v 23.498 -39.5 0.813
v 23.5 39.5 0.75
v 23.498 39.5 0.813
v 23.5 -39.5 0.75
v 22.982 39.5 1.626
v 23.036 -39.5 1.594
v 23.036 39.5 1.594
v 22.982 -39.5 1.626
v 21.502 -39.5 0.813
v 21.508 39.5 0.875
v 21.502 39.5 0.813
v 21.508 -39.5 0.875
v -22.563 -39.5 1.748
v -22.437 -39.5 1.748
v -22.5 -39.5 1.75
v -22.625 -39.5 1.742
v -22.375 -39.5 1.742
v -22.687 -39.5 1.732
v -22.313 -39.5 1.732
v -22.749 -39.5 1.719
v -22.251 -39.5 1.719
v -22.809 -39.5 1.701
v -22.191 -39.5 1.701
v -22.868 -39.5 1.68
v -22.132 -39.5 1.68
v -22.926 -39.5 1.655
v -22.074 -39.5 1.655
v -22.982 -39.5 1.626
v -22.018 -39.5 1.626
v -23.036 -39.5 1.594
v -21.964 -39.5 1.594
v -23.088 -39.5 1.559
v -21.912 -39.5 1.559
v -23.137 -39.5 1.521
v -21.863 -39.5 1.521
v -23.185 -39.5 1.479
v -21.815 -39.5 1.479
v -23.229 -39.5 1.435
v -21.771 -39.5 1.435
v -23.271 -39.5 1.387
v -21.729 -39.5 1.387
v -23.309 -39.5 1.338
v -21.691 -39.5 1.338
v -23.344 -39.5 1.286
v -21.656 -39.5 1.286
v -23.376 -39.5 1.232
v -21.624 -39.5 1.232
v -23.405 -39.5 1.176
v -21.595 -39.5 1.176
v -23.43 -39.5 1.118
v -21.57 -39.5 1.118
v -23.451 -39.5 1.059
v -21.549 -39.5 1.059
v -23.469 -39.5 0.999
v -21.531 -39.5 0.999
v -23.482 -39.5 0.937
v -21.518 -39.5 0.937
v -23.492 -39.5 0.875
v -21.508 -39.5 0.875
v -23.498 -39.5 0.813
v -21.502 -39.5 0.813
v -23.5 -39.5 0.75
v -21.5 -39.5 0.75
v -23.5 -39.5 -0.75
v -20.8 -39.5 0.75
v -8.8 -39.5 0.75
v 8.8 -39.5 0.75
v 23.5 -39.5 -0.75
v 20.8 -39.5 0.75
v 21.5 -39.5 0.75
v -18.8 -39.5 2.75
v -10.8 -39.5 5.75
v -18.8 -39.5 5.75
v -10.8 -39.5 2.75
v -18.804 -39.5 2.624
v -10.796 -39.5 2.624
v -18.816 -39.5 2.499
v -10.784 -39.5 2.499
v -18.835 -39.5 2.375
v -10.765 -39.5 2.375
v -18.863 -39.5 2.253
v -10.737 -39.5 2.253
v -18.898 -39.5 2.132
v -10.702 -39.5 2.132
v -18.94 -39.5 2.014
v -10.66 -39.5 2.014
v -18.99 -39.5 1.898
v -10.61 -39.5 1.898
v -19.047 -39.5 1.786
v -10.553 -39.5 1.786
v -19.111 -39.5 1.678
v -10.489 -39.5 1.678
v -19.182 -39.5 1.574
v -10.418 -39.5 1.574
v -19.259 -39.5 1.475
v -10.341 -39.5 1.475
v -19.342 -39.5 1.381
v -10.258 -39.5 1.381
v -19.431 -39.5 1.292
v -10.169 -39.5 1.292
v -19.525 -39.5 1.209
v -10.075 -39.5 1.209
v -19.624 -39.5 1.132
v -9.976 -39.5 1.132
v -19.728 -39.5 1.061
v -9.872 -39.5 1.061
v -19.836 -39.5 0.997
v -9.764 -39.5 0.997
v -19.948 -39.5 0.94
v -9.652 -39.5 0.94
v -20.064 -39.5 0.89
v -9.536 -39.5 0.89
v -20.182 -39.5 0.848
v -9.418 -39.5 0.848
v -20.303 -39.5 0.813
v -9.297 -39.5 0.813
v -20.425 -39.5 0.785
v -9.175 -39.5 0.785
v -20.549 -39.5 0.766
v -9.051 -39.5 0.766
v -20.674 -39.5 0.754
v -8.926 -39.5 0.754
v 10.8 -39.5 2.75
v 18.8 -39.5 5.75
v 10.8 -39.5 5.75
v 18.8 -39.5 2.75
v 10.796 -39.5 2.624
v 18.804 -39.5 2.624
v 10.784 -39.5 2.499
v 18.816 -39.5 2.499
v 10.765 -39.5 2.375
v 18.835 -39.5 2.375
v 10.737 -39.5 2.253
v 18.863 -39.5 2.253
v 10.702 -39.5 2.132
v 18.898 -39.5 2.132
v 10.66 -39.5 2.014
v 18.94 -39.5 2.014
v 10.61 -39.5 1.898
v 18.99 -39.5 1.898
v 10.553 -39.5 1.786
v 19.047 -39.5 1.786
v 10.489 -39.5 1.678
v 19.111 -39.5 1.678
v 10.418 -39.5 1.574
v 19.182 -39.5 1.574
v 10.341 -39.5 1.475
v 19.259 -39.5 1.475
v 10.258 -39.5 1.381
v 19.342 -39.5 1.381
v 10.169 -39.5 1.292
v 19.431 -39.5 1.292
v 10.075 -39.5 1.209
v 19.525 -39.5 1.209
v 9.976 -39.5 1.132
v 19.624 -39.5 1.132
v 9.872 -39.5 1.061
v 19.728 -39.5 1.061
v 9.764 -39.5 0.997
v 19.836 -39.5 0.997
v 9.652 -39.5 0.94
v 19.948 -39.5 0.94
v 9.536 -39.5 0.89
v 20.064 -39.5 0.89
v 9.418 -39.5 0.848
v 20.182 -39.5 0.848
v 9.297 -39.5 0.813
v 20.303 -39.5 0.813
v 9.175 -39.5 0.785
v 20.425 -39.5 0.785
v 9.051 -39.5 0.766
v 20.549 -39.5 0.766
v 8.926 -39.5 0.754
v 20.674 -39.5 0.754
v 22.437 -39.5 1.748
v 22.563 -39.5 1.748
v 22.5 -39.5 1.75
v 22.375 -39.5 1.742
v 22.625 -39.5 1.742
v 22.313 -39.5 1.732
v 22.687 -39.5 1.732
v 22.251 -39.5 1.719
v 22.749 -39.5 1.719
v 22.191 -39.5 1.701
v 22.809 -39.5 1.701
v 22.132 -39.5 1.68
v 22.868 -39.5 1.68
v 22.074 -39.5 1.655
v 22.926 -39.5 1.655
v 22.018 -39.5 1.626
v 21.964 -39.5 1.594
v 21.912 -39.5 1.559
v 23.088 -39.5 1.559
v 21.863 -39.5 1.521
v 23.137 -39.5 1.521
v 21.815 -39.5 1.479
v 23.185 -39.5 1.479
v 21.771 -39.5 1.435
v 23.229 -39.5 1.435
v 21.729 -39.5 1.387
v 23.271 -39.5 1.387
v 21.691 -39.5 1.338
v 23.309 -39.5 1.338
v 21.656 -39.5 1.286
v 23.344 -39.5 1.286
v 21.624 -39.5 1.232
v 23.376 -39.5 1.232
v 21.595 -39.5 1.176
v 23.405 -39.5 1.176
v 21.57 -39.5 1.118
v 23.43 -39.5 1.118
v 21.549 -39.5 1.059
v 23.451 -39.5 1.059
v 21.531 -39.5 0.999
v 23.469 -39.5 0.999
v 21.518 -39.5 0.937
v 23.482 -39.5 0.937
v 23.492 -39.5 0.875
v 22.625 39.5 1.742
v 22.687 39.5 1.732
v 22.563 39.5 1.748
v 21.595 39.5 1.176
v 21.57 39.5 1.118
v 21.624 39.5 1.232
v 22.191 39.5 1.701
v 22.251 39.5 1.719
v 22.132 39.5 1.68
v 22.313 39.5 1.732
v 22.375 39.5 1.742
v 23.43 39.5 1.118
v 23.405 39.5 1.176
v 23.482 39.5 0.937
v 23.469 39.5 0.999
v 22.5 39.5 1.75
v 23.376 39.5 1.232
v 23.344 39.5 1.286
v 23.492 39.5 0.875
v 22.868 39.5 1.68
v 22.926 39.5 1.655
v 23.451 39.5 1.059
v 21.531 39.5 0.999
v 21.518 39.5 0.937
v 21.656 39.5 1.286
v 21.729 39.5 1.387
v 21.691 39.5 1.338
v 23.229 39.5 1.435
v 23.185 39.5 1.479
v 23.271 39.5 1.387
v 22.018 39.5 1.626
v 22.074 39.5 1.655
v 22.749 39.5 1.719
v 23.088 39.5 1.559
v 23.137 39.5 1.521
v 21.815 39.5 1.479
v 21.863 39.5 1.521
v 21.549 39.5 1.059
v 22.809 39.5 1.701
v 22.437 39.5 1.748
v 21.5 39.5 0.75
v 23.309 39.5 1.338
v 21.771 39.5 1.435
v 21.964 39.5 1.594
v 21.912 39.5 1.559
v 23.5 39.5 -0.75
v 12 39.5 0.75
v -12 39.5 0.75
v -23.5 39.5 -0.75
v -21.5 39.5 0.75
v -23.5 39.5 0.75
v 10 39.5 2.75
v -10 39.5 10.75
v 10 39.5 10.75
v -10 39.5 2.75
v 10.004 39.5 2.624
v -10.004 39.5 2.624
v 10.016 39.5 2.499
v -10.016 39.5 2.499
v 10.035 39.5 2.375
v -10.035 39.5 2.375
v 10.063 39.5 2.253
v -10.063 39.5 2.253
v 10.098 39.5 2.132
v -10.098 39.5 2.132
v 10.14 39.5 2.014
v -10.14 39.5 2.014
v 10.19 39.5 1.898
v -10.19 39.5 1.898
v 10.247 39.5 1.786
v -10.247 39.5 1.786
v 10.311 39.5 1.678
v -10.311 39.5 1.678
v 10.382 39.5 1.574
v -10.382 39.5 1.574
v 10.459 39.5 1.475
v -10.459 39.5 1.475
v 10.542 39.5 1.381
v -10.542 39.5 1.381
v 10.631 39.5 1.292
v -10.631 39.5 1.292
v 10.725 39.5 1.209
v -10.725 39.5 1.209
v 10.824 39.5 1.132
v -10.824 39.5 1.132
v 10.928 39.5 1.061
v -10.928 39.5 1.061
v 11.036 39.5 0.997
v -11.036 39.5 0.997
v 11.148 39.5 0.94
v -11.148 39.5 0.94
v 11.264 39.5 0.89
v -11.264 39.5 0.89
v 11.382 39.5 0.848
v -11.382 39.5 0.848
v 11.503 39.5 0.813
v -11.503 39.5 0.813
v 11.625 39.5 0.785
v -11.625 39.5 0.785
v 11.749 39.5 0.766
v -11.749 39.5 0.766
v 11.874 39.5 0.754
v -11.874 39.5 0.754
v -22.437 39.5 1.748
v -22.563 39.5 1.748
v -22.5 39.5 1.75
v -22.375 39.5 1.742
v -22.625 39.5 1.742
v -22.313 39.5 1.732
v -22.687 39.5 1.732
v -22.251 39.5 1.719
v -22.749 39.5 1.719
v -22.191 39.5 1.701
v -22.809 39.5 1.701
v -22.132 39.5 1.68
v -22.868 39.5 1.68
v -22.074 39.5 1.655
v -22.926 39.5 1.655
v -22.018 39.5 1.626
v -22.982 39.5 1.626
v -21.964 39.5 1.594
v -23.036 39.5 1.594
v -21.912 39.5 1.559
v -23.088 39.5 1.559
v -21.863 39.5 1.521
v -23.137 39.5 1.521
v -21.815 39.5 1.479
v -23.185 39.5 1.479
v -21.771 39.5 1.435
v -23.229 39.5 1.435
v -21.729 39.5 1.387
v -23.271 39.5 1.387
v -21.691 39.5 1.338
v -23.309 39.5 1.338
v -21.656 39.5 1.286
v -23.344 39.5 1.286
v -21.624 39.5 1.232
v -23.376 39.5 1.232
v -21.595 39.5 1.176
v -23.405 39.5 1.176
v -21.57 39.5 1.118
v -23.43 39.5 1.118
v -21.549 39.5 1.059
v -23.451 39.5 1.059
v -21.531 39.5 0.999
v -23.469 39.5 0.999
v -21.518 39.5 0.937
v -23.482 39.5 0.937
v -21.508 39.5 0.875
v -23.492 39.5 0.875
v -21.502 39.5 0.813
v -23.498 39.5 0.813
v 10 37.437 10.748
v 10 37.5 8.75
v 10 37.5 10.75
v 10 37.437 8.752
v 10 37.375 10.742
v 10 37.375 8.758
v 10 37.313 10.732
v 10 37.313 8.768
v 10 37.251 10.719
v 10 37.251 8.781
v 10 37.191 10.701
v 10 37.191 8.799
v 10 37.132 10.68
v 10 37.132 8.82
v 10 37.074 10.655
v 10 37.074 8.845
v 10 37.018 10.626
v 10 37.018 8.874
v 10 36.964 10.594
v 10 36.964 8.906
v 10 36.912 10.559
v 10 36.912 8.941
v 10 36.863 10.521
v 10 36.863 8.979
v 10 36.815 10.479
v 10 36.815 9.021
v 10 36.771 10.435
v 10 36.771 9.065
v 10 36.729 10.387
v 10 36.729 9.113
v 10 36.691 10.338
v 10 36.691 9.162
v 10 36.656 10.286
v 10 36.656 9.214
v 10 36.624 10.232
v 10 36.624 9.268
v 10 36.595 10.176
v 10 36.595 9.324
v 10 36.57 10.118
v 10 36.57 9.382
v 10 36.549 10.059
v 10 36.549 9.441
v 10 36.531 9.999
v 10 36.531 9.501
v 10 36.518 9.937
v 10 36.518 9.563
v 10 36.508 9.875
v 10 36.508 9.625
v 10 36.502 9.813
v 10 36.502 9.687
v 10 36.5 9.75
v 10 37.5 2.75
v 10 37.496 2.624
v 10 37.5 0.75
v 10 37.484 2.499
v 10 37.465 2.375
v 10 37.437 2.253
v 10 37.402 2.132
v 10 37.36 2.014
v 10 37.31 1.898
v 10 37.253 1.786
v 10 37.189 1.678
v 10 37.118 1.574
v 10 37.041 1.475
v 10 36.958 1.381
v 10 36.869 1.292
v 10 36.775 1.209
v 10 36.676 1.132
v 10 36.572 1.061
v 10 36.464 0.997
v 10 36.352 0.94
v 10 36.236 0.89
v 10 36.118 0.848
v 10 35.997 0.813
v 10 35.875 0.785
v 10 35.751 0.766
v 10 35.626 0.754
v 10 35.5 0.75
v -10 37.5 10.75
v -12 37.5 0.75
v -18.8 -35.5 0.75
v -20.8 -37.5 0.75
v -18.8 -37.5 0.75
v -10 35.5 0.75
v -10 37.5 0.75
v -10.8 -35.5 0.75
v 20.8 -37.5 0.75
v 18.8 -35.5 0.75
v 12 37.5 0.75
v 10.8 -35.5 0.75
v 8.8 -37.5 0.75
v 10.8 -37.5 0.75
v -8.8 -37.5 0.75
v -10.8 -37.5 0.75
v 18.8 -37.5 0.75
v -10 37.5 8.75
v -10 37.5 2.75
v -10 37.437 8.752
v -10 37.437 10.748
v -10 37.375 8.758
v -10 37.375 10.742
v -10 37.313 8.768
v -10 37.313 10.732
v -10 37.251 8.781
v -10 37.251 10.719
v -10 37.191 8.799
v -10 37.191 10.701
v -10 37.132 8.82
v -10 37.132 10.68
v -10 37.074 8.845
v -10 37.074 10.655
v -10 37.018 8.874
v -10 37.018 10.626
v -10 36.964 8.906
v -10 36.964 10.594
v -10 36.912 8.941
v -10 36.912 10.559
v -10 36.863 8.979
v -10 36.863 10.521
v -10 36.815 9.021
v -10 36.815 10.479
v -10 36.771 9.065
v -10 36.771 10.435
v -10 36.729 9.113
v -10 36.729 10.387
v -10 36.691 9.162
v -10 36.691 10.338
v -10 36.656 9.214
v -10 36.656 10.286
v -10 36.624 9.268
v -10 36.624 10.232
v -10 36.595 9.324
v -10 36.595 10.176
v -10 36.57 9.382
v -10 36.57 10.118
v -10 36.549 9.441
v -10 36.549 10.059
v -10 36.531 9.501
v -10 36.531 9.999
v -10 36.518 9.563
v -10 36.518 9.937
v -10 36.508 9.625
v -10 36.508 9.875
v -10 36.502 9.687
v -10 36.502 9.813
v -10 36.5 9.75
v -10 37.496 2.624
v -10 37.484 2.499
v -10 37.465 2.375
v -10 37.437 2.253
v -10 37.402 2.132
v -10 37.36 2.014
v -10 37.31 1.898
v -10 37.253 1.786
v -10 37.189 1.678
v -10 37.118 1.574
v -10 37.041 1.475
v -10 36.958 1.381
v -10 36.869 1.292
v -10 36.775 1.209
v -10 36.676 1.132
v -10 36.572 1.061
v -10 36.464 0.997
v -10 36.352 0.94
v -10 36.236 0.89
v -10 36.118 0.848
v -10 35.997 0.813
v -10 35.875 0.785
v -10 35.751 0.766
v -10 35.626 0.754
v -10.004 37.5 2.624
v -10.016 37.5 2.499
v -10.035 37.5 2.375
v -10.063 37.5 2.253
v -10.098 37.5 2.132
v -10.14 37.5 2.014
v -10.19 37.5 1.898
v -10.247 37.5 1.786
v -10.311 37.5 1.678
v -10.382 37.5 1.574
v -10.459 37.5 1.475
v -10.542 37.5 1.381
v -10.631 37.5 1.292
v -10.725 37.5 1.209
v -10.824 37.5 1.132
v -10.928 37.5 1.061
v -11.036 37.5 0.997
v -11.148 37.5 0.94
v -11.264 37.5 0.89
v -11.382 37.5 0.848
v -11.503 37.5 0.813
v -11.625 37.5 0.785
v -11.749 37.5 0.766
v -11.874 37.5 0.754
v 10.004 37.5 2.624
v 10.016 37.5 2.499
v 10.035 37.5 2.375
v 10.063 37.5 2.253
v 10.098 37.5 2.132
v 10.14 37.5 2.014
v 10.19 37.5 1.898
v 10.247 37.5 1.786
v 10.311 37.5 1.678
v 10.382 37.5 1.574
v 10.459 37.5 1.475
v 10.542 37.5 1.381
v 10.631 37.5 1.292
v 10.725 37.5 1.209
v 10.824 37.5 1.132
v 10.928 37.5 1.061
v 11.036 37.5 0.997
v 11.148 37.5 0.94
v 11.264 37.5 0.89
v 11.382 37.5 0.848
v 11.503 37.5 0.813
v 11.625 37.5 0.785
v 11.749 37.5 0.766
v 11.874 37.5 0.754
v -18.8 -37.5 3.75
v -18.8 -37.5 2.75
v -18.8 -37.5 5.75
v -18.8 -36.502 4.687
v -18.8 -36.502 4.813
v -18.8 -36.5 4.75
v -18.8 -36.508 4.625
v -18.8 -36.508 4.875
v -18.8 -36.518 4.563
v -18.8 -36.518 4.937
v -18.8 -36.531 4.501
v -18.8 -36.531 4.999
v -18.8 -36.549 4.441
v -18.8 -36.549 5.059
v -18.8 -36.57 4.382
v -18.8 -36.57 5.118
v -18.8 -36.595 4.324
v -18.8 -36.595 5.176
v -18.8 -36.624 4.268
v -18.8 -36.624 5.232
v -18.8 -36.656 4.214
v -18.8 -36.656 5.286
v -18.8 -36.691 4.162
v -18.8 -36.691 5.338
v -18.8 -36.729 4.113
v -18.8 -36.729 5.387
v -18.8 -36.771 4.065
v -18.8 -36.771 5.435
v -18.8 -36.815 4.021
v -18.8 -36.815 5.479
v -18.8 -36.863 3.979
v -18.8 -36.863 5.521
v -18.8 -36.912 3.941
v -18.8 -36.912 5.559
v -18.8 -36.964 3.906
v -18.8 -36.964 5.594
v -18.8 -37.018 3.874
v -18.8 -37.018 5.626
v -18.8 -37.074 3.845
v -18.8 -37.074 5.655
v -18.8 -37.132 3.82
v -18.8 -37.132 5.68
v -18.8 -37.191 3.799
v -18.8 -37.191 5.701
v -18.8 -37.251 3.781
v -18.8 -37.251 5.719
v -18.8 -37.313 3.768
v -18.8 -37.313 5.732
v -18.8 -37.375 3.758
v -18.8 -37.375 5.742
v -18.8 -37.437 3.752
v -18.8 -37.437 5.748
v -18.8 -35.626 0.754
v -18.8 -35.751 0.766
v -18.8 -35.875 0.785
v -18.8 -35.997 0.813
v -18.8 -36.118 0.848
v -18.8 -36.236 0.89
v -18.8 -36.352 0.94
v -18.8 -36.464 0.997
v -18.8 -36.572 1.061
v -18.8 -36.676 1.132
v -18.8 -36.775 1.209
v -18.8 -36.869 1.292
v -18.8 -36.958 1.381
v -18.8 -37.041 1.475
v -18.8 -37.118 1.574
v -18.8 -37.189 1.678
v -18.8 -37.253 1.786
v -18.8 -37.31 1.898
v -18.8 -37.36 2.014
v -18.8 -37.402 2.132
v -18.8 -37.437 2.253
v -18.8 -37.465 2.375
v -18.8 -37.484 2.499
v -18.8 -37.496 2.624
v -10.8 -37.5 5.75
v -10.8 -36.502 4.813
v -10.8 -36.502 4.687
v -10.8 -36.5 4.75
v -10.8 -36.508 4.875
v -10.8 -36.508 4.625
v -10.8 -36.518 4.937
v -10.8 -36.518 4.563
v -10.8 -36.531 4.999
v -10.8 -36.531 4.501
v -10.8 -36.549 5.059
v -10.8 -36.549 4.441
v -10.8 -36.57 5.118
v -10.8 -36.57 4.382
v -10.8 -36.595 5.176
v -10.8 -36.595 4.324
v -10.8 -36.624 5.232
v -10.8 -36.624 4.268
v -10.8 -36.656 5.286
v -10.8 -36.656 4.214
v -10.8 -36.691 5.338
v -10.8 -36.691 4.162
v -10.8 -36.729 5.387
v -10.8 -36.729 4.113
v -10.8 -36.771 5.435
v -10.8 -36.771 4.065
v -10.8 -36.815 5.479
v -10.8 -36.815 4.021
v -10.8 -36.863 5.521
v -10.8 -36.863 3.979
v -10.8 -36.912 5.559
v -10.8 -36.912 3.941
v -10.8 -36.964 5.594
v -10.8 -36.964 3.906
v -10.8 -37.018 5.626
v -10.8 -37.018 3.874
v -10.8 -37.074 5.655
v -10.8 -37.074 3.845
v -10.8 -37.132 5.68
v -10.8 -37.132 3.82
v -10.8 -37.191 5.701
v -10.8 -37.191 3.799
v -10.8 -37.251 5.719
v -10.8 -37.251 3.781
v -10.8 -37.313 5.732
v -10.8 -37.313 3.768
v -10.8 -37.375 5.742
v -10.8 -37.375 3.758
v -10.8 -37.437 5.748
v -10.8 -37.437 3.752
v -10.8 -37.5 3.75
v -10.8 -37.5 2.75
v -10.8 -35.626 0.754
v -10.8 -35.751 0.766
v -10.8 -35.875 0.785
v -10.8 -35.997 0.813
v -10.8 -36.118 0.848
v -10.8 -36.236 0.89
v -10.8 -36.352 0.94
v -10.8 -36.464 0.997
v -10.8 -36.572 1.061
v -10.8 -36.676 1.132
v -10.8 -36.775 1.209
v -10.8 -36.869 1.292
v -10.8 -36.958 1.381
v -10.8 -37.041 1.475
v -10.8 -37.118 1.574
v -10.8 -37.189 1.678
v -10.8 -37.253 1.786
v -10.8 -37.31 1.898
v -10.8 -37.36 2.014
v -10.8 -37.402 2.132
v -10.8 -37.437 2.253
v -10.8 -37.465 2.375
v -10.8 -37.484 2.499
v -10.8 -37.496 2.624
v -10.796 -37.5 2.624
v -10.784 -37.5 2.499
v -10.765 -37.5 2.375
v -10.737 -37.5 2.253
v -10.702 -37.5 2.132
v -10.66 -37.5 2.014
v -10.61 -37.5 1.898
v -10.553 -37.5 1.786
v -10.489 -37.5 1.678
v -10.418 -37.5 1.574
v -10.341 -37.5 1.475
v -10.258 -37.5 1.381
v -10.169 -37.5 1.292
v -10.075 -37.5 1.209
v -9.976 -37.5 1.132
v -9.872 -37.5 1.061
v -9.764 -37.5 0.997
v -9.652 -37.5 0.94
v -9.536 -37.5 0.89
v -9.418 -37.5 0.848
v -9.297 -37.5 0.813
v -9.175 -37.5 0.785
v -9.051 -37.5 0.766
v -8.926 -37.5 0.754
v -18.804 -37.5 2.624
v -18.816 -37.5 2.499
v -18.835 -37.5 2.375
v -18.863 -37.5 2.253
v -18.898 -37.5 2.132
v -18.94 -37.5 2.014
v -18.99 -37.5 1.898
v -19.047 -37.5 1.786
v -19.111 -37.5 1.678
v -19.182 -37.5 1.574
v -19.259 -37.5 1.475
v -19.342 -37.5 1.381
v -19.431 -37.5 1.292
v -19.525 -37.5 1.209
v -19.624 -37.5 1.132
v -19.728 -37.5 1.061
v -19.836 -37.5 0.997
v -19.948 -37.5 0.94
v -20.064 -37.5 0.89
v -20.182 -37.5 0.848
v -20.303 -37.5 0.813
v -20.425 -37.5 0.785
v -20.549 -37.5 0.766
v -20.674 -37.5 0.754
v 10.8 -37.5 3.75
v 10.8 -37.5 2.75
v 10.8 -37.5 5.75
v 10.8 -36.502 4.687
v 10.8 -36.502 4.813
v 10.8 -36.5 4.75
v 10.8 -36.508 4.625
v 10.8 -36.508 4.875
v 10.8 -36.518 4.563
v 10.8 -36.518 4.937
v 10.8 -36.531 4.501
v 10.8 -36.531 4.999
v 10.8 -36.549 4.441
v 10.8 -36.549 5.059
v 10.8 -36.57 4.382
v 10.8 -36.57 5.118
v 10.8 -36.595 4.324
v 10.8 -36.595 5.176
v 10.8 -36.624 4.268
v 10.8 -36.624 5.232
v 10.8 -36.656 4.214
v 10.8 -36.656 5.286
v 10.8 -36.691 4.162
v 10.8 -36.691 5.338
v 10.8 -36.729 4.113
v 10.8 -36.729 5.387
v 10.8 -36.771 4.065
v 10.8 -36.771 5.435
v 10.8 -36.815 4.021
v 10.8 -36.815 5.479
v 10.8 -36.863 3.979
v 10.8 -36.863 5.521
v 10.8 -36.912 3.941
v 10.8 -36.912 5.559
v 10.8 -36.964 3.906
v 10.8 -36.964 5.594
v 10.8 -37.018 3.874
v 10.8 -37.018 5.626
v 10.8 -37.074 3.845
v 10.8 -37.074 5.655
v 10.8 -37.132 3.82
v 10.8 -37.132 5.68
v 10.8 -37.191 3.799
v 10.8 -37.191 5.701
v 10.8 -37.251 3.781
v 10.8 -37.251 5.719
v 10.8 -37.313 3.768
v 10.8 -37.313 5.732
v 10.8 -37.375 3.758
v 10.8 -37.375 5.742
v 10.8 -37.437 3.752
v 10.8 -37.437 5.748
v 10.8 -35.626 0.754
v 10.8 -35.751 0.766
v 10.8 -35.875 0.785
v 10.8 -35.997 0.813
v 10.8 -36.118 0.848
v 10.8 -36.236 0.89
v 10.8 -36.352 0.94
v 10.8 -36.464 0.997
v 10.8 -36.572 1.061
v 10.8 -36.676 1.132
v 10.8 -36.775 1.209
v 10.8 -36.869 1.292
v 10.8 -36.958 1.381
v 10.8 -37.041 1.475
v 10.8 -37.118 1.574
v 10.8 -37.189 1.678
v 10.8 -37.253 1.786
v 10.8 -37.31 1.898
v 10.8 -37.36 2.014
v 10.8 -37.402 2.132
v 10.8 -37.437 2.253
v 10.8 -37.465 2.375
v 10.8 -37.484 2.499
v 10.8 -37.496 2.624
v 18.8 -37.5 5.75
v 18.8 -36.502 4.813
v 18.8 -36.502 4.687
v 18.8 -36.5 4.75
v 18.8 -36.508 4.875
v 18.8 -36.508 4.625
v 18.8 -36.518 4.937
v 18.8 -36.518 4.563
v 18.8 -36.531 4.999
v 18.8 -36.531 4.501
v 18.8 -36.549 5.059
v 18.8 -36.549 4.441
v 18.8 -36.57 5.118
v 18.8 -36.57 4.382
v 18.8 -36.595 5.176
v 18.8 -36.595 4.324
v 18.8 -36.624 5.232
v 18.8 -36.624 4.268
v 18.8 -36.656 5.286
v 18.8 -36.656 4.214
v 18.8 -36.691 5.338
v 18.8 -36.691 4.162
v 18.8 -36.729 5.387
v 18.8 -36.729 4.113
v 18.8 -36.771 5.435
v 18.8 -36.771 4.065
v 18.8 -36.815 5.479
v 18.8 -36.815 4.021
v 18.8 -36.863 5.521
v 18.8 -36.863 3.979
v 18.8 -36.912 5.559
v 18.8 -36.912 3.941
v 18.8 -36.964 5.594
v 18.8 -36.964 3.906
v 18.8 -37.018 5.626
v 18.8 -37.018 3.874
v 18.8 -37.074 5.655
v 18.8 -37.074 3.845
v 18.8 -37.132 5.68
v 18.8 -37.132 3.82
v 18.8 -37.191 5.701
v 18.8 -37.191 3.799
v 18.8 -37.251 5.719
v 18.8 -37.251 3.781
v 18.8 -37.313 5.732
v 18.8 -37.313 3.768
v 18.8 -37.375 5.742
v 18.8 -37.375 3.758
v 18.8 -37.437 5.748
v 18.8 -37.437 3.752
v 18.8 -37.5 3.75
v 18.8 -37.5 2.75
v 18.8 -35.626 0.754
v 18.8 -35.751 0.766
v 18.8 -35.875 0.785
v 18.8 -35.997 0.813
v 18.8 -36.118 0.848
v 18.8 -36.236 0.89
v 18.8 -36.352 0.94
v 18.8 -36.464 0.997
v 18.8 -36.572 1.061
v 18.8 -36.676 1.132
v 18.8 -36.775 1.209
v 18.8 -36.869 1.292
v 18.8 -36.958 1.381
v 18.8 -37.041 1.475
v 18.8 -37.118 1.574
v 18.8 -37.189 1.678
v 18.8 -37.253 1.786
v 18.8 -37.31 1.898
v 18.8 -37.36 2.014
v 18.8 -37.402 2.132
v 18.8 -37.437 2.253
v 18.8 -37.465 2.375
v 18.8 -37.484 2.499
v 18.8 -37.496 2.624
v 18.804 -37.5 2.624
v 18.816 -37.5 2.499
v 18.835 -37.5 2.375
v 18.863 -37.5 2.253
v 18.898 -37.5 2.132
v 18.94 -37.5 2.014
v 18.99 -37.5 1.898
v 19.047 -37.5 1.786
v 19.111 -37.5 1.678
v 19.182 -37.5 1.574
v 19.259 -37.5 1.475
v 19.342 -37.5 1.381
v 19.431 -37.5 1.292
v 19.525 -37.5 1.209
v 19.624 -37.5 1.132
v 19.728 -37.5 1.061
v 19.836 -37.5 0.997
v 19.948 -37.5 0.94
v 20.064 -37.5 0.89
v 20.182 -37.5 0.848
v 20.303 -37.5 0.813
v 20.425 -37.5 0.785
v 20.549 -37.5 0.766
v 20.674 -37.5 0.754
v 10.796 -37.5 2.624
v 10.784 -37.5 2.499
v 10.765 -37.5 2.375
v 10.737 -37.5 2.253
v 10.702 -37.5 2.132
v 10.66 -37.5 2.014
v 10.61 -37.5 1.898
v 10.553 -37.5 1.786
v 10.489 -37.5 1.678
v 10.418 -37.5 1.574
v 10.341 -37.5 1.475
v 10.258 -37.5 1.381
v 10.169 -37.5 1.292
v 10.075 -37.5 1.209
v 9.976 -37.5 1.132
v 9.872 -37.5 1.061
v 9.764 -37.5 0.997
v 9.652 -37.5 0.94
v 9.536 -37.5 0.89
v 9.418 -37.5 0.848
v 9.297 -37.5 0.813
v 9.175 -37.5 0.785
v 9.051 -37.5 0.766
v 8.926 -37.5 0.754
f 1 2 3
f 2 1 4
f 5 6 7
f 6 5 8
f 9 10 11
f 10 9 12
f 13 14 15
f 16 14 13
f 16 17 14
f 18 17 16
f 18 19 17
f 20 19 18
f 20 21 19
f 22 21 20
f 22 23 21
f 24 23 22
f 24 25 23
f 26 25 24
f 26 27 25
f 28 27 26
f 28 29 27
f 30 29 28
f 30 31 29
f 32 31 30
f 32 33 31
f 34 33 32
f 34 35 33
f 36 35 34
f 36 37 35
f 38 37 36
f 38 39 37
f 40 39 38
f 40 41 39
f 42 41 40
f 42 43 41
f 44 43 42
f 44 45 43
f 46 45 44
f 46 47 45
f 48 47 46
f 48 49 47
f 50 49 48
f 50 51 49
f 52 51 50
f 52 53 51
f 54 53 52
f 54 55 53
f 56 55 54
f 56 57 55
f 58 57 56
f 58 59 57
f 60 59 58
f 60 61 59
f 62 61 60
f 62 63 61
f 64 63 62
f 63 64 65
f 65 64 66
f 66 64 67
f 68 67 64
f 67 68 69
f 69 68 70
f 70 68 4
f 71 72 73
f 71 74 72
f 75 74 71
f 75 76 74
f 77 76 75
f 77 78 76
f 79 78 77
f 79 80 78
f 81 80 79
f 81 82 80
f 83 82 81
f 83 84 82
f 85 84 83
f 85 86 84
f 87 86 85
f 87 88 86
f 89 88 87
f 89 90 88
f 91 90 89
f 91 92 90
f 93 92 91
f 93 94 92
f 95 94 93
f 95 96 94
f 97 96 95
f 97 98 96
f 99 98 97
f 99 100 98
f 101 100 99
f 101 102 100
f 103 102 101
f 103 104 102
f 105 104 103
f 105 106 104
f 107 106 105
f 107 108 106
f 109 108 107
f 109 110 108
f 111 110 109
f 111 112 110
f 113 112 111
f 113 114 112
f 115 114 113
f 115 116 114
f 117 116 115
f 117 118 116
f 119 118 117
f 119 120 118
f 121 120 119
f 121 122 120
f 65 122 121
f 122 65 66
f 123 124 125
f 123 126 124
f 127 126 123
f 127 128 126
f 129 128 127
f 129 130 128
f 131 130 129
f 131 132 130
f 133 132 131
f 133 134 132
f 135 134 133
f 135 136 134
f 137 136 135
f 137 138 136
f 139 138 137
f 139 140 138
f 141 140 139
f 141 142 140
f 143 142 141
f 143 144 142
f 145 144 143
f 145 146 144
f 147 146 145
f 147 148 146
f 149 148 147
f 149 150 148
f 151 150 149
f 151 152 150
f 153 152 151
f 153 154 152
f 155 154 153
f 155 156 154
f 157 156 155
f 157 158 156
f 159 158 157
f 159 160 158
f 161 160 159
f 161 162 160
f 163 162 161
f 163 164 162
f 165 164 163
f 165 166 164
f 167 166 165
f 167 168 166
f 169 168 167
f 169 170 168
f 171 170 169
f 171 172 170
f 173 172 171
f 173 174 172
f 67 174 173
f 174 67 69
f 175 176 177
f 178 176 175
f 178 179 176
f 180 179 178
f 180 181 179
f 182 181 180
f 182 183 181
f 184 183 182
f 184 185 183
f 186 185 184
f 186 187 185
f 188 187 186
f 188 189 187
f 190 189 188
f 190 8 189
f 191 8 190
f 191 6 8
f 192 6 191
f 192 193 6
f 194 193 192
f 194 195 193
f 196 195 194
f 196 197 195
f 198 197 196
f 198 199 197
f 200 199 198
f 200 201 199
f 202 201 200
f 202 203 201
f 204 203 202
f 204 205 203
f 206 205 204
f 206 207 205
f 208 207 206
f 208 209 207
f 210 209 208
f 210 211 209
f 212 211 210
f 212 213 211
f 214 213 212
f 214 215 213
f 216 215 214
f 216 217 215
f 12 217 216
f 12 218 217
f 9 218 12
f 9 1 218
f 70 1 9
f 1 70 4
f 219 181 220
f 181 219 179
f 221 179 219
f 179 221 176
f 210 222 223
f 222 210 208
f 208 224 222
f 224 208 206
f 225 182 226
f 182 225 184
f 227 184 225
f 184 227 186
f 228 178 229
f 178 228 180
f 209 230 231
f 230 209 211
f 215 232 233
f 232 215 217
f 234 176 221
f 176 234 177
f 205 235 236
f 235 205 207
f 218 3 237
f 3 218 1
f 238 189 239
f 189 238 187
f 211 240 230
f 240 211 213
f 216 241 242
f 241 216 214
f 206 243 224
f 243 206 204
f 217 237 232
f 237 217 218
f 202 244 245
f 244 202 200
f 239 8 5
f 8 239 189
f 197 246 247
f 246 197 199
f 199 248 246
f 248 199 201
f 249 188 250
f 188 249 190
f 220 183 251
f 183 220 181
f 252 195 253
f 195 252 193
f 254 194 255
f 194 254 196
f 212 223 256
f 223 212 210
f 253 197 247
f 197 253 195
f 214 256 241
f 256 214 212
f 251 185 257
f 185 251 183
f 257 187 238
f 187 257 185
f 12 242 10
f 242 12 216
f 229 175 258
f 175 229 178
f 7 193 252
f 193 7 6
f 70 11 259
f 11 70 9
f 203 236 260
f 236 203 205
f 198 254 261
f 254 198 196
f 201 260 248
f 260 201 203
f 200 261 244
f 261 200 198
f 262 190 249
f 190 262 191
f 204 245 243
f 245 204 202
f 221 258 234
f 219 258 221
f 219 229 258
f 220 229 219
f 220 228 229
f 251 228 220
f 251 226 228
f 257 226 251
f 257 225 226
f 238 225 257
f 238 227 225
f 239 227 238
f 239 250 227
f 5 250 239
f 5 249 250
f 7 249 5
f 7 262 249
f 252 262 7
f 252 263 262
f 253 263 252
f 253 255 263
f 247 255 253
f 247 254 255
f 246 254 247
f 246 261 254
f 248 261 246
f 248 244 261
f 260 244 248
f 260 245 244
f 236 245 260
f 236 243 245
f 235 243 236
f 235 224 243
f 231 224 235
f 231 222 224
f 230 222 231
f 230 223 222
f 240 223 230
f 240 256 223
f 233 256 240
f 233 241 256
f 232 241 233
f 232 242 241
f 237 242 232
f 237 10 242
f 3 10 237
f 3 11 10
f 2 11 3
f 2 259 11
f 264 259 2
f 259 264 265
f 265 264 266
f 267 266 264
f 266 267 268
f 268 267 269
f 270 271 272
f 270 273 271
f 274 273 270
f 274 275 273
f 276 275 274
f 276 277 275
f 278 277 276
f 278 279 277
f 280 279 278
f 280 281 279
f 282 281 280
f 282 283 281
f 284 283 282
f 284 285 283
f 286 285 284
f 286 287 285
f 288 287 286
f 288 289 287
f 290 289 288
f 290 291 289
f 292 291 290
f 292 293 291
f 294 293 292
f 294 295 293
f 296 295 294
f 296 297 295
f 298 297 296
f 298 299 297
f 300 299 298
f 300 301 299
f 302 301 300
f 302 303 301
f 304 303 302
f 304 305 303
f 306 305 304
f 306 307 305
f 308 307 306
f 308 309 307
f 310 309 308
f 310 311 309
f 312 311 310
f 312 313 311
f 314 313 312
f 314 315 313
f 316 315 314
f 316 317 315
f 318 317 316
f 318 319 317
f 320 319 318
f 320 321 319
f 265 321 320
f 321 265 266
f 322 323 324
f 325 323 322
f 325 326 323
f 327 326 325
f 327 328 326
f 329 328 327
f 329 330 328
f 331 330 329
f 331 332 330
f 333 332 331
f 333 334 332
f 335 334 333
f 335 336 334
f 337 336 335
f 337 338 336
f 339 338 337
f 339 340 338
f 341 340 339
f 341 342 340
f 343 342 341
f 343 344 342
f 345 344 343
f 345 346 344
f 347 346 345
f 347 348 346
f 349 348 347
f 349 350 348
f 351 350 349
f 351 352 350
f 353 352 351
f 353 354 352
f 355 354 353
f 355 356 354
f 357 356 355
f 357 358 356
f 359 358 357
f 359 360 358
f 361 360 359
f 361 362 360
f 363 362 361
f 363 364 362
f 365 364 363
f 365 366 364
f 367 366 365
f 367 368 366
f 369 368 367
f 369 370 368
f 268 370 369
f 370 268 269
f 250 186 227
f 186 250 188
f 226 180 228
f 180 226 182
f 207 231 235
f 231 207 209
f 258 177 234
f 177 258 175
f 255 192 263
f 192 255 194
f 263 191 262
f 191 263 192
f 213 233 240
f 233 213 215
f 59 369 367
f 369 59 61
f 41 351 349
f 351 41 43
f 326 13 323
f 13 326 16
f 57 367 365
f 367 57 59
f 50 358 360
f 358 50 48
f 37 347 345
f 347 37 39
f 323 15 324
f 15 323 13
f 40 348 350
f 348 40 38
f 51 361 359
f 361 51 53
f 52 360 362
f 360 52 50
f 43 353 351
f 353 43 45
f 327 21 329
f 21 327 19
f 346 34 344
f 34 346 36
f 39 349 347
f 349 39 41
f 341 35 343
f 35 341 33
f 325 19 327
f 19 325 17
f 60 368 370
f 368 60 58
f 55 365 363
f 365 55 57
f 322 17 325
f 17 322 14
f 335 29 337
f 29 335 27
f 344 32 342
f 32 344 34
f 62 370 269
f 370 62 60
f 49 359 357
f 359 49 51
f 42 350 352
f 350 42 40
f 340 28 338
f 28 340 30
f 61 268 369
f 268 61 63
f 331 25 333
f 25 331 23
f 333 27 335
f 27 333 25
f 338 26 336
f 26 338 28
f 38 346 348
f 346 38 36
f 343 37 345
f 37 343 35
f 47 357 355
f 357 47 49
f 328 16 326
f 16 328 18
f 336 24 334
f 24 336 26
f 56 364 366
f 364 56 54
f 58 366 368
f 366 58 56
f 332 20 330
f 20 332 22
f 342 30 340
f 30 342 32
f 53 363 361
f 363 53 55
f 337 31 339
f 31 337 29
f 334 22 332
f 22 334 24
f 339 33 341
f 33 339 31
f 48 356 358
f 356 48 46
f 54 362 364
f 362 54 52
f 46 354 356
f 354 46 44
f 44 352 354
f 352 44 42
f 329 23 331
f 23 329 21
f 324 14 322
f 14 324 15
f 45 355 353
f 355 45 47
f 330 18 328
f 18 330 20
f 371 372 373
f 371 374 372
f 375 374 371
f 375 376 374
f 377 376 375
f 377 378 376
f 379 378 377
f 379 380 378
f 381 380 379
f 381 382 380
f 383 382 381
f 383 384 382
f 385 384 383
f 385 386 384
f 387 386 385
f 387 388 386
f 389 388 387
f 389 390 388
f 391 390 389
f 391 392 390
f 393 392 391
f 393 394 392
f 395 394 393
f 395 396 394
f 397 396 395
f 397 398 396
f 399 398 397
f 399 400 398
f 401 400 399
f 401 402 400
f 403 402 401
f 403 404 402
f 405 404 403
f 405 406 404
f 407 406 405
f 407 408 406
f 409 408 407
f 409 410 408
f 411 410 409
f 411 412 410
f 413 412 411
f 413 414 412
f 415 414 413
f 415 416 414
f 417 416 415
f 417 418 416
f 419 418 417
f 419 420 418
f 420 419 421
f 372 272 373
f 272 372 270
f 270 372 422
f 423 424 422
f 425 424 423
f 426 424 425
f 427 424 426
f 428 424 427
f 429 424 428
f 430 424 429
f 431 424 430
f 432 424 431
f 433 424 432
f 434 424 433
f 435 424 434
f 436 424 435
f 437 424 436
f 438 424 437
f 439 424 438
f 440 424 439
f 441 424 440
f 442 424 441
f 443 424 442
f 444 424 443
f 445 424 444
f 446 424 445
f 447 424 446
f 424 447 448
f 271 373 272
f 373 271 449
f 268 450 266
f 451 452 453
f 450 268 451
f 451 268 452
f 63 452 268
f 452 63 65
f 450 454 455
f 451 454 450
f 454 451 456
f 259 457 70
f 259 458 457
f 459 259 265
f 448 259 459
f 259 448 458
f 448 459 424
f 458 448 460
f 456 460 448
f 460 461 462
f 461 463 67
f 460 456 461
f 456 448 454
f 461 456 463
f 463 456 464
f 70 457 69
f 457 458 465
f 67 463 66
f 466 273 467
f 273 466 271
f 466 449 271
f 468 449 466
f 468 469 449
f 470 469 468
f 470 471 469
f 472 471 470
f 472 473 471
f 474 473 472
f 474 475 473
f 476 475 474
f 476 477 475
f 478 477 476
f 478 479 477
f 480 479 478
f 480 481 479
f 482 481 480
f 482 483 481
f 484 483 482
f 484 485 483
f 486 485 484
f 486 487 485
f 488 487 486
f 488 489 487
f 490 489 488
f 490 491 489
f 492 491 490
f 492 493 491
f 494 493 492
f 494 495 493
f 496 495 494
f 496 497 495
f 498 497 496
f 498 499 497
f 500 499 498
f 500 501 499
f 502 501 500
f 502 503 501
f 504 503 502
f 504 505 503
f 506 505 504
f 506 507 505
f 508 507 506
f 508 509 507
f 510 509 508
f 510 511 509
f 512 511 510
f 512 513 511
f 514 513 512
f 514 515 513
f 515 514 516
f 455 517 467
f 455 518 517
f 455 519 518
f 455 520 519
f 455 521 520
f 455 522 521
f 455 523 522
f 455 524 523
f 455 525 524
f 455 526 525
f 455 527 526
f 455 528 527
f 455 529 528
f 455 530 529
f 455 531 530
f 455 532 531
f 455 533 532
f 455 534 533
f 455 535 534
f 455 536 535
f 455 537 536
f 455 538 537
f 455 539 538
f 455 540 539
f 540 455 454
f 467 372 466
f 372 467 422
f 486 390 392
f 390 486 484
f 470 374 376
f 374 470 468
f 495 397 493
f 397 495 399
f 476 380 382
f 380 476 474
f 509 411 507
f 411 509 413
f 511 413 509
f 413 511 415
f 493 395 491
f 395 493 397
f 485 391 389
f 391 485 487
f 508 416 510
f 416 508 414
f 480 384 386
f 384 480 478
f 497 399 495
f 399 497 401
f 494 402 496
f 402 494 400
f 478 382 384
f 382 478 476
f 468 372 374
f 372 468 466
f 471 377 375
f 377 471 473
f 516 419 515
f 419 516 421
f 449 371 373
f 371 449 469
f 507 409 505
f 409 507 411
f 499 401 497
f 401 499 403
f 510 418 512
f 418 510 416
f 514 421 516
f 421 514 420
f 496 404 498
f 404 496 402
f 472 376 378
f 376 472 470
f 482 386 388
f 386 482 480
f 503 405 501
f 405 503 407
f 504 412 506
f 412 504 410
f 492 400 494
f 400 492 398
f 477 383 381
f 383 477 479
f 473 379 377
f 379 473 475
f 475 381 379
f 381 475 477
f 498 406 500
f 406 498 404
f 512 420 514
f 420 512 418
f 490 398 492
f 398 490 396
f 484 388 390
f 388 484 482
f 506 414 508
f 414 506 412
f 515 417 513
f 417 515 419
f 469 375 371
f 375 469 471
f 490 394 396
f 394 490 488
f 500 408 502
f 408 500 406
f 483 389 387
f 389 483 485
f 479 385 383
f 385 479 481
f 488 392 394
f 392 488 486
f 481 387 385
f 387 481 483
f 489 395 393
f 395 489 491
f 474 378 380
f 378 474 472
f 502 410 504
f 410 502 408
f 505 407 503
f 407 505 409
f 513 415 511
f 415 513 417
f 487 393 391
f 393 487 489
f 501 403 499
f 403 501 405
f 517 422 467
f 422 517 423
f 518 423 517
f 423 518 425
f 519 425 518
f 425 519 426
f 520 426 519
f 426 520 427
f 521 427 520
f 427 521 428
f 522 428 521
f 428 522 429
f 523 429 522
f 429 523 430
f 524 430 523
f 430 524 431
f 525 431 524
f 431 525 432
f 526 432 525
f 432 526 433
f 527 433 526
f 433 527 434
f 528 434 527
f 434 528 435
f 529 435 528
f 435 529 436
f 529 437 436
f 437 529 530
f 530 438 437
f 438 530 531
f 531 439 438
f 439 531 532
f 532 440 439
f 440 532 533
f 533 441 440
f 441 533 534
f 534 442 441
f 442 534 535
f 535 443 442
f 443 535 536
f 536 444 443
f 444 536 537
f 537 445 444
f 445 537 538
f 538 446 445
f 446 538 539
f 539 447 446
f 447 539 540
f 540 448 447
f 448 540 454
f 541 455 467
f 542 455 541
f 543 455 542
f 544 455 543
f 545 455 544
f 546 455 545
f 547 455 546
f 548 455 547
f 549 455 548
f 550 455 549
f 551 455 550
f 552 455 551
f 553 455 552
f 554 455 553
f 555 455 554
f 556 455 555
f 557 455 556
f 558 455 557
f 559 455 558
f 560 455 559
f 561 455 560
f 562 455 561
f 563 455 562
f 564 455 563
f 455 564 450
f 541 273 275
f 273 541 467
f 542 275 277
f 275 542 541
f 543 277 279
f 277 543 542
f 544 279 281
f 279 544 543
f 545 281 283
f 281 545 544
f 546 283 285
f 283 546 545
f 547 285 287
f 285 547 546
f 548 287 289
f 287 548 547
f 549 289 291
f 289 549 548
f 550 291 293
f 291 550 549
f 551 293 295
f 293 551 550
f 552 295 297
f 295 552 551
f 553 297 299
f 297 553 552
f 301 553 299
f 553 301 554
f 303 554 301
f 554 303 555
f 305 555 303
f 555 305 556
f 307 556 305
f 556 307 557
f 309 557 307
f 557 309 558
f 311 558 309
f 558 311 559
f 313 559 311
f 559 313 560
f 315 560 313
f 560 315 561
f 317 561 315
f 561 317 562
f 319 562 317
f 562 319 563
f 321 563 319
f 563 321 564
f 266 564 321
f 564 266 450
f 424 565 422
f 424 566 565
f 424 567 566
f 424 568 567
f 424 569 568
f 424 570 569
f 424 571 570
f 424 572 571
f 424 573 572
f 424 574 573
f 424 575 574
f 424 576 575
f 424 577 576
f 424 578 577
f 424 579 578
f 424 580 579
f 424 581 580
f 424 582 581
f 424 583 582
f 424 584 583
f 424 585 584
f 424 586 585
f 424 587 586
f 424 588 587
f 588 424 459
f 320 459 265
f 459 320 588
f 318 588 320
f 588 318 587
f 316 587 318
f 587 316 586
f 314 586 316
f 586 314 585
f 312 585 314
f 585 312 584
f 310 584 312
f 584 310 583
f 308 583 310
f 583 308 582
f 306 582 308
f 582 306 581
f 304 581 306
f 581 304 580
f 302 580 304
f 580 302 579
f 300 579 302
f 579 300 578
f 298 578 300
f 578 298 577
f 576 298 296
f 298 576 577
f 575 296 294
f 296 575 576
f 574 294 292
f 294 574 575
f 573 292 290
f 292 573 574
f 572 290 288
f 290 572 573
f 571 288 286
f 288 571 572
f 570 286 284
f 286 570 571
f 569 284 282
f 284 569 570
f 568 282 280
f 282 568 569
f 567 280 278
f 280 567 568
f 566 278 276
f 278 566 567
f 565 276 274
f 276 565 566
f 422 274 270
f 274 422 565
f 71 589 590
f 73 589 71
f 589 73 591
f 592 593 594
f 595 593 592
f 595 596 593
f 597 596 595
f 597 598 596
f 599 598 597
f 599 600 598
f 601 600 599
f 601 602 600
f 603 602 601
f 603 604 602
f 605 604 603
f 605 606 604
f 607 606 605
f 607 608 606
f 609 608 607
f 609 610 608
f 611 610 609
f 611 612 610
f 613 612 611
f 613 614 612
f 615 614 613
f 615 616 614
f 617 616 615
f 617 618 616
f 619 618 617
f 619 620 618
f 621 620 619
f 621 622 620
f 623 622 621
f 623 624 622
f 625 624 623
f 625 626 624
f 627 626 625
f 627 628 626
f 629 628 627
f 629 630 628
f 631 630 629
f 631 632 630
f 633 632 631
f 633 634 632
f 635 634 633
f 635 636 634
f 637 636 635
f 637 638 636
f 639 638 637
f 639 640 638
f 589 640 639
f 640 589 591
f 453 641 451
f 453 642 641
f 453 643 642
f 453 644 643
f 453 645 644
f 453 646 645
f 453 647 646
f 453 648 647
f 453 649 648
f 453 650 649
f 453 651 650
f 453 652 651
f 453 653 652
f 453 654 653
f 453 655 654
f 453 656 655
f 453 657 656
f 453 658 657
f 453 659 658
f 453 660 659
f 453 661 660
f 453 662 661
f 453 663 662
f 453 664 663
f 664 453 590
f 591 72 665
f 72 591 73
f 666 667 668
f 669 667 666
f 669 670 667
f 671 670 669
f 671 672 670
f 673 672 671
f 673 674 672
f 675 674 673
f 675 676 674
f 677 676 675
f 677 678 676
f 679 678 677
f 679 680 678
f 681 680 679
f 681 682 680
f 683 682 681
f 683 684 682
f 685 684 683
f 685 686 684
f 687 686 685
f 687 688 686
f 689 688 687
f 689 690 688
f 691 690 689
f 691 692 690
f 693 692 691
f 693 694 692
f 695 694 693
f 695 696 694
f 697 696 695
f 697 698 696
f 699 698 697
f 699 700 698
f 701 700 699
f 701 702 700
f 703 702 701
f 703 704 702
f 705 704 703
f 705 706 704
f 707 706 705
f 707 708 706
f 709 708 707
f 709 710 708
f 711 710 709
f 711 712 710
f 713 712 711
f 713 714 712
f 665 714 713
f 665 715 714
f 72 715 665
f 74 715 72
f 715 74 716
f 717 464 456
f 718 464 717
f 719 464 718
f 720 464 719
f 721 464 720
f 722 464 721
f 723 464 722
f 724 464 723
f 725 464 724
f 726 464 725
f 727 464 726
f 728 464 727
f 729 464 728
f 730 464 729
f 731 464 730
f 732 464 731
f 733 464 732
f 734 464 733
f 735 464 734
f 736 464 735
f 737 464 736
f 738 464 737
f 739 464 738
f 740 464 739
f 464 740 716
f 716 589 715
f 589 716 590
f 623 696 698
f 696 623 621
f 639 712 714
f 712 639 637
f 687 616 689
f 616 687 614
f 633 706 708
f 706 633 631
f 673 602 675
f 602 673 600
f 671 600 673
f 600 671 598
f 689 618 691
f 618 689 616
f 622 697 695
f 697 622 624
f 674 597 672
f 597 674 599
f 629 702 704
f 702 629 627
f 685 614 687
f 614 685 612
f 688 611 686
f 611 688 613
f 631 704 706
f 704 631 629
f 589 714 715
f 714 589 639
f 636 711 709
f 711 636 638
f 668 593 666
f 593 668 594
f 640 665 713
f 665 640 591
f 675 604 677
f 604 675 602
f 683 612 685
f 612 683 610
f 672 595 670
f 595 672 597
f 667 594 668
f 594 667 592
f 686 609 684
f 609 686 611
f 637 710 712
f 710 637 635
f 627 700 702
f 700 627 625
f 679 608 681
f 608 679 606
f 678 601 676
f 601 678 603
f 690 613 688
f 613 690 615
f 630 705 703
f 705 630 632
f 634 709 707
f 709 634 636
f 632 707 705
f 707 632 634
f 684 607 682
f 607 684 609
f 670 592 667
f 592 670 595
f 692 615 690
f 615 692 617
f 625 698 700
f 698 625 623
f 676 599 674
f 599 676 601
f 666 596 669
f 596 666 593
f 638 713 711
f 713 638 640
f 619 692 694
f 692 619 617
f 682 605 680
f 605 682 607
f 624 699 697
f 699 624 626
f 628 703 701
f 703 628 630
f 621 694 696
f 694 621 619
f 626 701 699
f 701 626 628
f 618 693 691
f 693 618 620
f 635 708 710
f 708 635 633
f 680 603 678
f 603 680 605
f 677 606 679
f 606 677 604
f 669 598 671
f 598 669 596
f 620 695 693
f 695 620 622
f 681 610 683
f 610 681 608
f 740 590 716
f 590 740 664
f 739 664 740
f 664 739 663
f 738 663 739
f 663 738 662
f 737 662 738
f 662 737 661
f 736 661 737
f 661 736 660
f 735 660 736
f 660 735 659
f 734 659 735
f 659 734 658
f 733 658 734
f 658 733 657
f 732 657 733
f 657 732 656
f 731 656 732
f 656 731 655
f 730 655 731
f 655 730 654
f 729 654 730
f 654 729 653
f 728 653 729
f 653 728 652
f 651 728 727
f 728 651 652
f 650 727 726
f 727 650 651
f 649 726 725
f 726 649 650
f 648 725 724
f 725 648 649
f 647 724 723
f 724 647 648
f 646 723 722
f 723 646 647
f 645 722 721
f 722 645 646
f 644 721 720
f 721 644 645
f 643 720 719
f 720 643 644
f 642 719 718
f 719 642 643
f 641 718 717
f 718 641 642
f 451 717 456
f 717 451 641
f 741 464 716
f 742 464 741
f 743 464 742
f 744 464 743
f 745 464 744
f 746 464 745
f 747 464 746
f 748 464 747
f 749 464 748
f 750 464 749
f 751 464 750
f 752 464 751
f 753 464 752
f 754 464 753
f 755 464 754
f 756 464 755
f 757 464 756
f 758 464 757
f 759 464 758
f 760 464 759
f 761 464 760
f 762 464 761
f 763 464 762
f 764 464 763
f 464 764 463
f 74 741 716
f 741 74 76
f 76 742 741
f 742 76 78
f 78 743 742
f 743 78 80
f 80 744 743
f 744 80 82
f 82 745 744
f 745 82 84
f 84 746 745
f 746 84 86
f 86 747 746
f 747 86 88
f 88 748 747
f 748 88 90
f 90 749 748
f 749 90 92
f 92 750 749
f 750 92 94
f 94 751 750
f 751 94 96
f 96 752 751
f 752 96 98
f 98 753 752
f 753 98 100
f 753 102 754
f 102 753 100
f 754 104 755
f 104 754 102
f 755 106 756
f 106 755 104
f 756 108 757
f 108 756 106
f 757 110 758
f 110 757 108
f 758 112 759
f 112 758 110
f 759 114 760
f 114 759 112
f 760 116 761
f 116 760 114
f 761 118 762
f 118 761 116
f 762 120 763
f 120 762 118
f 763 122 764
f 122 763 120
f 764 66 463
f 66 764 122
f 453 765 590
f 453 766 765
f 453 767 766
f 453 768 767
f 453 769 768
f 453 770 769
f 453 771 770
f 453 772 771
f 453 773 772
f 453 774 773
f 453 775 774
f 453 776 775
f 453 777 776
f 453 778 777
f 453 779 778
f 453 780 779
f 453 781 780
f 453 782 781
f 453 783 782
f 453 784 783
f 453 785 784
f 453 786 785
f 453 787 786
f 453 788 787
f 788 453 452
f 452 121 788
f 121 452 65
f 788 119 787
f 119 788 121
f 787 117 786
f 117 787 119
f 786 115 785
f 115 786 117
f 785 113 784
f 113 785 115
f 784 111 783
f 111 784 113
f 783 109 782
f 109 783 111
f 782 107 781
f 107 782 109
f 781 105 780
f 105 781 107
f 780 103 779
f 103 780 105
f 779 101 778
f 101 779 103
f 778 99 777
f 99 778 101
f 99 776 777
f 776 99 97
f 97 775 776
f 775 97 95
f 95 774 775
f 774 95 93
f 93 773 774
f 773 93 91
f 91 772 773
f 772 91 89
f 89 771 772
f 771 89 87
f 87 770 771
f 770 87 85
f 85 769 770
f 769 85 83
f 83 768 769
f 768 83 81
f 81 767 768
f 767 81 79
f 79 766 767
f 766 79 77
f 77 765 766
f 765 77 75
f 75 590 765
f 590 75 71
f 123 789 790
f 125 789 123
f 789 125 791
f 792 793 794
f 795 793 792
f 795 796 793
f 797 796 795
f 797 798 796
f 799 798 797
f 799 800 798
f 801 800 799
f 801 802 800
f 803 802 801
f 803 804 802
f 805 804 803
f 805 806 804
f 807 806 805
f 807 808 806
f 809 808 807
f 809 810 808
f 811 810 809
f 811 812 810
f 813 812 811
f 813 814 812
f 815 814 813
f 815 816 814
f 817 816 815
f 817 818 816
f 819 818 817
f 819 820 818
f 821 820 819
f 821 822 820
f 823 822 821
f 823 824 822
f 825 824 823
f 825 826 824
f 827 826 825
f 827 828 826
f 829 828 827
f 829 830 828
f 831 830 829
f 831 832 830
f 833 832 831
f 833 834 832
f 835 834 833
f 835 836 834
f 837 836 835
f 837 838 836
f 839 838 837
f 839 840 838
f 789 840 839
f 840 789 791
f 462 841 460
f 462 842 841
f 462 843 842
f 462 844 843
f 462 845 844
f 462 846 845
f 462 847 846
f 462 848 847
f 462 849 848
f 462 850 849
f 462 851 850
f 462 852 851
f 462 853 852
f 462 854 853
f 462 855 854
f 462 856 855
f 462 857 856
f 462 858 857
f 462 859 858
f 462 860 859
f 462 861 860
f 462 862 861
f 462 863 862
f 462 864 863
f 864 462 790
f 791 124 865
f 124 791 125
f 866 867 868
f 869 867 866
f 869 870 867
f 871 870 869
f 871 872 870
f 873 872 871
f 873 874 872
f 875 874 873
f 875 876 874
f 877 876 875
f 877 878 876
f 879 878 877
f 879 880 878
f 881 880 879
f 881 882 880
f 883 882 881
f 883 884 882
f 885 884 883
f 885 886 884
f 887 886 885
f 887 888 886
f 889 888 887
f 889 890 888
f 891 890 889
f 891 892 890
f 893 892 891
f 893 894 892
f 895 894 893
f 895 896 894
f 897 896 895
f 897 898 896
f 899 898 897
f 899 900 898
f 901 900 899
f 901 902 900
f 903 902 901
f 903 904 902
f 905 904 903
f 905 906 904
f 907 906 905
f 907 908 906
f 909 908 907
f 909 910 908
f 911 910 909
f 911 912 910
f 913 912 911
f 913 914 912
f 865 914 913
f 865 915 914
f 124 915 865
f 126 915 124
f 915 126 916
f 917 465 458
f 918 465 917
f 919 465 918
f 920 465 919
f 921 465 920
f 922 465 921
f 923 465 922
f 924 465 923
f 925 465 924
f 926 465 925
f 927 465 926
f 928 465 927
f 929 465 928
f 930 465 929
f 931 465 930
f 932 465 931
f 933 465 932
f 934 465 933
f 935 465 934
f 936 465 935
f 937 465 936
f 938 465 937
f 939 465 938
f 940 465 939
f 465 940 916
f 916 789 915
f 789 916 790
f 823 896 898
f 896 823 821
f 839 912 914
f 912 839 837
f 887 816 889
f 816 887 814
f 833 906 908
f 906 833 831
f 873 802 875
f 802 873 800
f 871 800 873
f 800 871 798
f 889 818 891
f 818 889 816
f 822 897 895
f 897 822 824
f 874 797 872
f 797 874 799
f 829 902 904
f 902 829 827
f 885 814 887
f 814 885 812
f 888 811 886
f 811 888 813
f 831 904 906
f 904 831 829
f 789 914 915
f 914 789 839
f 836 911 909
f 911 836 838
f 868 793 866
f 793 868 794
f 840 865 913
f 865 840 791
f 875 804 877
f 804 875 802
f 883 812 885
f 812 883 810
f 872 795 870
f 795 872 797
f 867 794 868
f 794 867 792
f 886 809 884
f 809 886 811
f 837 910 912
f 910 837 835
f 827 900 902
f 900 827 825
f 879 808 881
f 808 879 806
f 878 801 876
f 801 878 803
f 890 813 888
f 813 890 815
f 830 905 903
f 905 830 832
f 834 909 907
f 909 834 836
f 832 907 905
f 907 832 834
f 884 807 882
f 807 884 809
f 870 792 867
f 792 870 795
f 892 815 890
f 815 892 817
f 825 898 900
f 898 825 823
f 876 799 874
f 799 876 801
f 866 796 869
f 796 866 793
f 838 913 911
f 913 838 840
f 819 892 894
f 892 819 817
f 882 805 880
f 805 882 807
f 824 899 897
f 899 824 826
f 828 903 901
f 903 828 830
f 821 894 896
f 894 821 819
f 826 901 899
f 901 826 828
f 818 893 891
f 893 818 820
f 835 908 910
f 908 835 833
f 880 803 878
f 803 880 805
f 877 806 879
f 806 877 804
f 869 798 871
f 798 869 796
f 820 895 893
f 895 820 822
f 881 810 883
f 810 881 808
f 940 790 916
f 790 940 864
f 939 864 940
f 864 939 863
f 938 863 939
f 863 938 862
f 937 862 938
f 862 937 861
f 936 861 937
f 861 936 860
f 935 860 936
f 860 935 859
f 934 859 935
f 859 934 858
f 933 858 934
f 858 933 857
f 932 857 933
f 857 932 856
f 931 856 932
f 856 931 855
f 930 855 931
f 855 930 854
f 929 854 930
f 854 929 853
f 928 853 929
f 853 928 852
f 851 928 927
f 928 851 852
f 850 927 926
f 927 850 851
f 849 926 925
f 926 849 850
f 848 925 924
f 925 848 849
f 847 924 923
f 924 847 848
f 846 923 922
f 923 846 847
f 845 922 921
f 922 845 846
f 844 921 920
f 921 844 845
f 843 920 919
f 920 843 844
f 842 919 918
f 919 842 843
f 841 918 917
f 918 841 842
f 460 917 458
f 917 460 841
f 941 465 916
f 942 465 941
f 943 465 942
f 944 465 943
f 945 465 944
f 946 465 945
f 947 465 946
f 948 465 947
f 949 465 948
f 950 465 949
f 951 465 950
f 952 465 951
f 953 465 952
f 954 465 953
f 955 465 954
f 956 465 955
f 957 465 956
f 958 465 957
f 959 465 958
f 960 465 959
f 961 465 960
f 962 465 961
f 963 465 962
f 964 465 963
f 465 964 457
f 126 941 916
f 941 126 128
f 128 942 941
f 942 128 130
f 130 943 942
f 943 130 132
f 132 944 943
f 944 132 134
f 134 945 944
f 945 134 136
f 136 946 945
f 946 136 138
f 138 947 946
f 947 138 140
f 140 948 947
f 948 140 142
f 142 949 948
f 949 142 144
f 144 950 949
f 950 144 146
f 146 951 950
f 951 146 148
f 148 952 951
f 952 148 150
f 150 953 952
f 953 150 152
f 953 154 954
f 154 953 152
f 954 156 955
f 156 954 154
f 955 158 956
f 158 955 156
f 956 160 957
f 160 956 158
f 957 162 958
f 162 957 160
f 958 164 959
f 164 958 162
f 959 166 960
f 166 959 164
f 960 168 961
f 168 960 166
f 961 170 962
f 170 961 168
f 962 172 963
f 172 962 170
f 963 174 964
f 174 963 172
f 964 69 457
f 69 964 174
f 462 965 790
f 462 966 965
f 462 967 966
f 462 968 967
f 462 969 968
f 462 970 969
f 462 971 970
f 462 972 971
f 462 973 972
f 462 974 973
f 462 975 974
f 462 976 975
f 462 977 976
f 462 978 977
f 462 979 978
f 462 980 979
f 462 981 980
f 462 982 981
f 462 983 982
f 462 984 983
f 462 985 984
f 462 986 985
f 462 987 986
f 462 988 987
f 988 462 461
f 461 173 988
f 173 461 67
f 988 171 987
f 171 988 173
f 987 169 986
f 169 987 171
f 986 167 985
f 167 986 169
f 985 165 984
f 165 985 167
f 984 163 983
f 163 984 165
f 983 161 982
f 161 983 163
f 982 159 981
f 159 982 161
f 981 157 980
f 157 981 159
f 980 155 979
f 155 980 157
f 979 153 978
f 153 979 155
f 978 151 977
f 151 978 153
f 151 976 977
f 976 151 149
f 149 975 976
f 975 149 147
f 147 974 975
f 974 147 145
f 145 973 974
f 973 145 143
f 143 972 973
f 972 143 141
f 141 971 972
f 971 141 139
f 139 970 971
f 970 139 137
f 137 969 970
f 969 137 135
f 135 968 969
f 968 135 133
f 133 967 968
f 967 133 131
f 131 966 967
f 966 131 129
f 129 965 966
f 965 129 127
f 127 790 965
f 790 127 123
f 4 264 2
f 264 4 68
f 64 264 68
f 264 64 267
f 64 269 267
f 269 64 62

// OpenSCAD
baseplate_length=79;
baseplate_width=47;
baseplate_height=1.5;

module create_base_plate(){   
    cube([baseplate_width,baseplate_length,baseplate_height], true);
}

module create_side_boarder(){
    boarder_radius=1;
    x_offset=baseplate_width/2-boarder_radius;
    z_offset=baseplate_height/2;
    
    translate([x_offset,0,z_offset])
    rotate([90,0,0])
    linear_extrude(baseplate_length,center=true,convexity = 10)
    circle(r = boarder_radius, $fn = 100); 
    
    translate([-x_offset,0,z_offset])
    rotate([90,0,0])
    linear_extrude(baseplate_length,center=true,convexity = 10)
    circle(r = boarder_radius, $fn = 100); 
}


module stability_rounding(lenght, rounding_radius){
    linear_extrude(lenght,center=false,convexity = 10)
    difference()
    {
        square(rounding_radius);
        circle(r = rounding_radius, $fn = 100); 
    }
}

module create_arm(arm_height, arm_width, arm_thinkness, finger_radius){

    // create arm 
    cube([arm_width,arm_thinkness,arm_height]);
    
    // add fingers to top of arm 
    translate([0,0,arm_height-finger_radius])
    rotate([0,90,0])
    linear_extrude(arm_width,center=false,convexity = 10)
    circle(r = finger_radius, $fn = 100); 
    
    
    // add rounding to arm bottom for more stability
    rounding_radius=arm_thinkness;
    
    // add rounding to the front 
    translate([0, -arm_thinkness, rounding_radius])
    rotate([0,90,0])
    stability_rounding(arm_width, rounding_radius);
    
    // add rounding to the left side
    translate([-rounding_radius,arm_thinkness,rounding_radius])
    rotate([90,90,0])
    stability_rounding(arm_thinkness, rounding_radius);
    
    // add rounding to the right side
    translate([rounding_radius+arm_width,arm_thinkness,rounding_radius])
    rotate([90,180,0])
    stability_rounding(arm_thinkness, rounding_radius);
    
}





module create_front_arm(){
    arm_thinkness=2;
    arm_height=10;
    arm_width=20;
    finger_radius=1;
    
    x_offset=-arm_width/2;
    y_offset=baseplate_length/2-arm_thinkness;
    z_offset=baseplate_height/2;
    
    translate([x_offset, y_offset, z_offset])
    create_arm(arm_height, arm_width, arm_thinkness, finger_radius);
}

module create_back_arm(){
    arm_thinkness=2;
    arm_height=5;
    arm_width=8;
    finger_radius=1;
    
    y_offset=baseplate_length/2-arm_thinkness;
    x_offset=baseplate_width*0.4;
    z_offset=baseplate_height/2;
    
    rotate([0,0,180])
    translate([x_offset-arm_width, y_offset, z_offset])
    create_arm(arm_height, arm_width, arm_thinkness, finger_radius);
    
    rotate([0,0,180])
    translate([-x_offset, y_offset, z_offset])
    create_arm(arm_height, arm_width, arm_thinkness, finger_radius);
}

module main()
{
    create_base_plate();
    create_side_boarder();
    create_front_arm();
    
    create_back_arm();
}
main();
